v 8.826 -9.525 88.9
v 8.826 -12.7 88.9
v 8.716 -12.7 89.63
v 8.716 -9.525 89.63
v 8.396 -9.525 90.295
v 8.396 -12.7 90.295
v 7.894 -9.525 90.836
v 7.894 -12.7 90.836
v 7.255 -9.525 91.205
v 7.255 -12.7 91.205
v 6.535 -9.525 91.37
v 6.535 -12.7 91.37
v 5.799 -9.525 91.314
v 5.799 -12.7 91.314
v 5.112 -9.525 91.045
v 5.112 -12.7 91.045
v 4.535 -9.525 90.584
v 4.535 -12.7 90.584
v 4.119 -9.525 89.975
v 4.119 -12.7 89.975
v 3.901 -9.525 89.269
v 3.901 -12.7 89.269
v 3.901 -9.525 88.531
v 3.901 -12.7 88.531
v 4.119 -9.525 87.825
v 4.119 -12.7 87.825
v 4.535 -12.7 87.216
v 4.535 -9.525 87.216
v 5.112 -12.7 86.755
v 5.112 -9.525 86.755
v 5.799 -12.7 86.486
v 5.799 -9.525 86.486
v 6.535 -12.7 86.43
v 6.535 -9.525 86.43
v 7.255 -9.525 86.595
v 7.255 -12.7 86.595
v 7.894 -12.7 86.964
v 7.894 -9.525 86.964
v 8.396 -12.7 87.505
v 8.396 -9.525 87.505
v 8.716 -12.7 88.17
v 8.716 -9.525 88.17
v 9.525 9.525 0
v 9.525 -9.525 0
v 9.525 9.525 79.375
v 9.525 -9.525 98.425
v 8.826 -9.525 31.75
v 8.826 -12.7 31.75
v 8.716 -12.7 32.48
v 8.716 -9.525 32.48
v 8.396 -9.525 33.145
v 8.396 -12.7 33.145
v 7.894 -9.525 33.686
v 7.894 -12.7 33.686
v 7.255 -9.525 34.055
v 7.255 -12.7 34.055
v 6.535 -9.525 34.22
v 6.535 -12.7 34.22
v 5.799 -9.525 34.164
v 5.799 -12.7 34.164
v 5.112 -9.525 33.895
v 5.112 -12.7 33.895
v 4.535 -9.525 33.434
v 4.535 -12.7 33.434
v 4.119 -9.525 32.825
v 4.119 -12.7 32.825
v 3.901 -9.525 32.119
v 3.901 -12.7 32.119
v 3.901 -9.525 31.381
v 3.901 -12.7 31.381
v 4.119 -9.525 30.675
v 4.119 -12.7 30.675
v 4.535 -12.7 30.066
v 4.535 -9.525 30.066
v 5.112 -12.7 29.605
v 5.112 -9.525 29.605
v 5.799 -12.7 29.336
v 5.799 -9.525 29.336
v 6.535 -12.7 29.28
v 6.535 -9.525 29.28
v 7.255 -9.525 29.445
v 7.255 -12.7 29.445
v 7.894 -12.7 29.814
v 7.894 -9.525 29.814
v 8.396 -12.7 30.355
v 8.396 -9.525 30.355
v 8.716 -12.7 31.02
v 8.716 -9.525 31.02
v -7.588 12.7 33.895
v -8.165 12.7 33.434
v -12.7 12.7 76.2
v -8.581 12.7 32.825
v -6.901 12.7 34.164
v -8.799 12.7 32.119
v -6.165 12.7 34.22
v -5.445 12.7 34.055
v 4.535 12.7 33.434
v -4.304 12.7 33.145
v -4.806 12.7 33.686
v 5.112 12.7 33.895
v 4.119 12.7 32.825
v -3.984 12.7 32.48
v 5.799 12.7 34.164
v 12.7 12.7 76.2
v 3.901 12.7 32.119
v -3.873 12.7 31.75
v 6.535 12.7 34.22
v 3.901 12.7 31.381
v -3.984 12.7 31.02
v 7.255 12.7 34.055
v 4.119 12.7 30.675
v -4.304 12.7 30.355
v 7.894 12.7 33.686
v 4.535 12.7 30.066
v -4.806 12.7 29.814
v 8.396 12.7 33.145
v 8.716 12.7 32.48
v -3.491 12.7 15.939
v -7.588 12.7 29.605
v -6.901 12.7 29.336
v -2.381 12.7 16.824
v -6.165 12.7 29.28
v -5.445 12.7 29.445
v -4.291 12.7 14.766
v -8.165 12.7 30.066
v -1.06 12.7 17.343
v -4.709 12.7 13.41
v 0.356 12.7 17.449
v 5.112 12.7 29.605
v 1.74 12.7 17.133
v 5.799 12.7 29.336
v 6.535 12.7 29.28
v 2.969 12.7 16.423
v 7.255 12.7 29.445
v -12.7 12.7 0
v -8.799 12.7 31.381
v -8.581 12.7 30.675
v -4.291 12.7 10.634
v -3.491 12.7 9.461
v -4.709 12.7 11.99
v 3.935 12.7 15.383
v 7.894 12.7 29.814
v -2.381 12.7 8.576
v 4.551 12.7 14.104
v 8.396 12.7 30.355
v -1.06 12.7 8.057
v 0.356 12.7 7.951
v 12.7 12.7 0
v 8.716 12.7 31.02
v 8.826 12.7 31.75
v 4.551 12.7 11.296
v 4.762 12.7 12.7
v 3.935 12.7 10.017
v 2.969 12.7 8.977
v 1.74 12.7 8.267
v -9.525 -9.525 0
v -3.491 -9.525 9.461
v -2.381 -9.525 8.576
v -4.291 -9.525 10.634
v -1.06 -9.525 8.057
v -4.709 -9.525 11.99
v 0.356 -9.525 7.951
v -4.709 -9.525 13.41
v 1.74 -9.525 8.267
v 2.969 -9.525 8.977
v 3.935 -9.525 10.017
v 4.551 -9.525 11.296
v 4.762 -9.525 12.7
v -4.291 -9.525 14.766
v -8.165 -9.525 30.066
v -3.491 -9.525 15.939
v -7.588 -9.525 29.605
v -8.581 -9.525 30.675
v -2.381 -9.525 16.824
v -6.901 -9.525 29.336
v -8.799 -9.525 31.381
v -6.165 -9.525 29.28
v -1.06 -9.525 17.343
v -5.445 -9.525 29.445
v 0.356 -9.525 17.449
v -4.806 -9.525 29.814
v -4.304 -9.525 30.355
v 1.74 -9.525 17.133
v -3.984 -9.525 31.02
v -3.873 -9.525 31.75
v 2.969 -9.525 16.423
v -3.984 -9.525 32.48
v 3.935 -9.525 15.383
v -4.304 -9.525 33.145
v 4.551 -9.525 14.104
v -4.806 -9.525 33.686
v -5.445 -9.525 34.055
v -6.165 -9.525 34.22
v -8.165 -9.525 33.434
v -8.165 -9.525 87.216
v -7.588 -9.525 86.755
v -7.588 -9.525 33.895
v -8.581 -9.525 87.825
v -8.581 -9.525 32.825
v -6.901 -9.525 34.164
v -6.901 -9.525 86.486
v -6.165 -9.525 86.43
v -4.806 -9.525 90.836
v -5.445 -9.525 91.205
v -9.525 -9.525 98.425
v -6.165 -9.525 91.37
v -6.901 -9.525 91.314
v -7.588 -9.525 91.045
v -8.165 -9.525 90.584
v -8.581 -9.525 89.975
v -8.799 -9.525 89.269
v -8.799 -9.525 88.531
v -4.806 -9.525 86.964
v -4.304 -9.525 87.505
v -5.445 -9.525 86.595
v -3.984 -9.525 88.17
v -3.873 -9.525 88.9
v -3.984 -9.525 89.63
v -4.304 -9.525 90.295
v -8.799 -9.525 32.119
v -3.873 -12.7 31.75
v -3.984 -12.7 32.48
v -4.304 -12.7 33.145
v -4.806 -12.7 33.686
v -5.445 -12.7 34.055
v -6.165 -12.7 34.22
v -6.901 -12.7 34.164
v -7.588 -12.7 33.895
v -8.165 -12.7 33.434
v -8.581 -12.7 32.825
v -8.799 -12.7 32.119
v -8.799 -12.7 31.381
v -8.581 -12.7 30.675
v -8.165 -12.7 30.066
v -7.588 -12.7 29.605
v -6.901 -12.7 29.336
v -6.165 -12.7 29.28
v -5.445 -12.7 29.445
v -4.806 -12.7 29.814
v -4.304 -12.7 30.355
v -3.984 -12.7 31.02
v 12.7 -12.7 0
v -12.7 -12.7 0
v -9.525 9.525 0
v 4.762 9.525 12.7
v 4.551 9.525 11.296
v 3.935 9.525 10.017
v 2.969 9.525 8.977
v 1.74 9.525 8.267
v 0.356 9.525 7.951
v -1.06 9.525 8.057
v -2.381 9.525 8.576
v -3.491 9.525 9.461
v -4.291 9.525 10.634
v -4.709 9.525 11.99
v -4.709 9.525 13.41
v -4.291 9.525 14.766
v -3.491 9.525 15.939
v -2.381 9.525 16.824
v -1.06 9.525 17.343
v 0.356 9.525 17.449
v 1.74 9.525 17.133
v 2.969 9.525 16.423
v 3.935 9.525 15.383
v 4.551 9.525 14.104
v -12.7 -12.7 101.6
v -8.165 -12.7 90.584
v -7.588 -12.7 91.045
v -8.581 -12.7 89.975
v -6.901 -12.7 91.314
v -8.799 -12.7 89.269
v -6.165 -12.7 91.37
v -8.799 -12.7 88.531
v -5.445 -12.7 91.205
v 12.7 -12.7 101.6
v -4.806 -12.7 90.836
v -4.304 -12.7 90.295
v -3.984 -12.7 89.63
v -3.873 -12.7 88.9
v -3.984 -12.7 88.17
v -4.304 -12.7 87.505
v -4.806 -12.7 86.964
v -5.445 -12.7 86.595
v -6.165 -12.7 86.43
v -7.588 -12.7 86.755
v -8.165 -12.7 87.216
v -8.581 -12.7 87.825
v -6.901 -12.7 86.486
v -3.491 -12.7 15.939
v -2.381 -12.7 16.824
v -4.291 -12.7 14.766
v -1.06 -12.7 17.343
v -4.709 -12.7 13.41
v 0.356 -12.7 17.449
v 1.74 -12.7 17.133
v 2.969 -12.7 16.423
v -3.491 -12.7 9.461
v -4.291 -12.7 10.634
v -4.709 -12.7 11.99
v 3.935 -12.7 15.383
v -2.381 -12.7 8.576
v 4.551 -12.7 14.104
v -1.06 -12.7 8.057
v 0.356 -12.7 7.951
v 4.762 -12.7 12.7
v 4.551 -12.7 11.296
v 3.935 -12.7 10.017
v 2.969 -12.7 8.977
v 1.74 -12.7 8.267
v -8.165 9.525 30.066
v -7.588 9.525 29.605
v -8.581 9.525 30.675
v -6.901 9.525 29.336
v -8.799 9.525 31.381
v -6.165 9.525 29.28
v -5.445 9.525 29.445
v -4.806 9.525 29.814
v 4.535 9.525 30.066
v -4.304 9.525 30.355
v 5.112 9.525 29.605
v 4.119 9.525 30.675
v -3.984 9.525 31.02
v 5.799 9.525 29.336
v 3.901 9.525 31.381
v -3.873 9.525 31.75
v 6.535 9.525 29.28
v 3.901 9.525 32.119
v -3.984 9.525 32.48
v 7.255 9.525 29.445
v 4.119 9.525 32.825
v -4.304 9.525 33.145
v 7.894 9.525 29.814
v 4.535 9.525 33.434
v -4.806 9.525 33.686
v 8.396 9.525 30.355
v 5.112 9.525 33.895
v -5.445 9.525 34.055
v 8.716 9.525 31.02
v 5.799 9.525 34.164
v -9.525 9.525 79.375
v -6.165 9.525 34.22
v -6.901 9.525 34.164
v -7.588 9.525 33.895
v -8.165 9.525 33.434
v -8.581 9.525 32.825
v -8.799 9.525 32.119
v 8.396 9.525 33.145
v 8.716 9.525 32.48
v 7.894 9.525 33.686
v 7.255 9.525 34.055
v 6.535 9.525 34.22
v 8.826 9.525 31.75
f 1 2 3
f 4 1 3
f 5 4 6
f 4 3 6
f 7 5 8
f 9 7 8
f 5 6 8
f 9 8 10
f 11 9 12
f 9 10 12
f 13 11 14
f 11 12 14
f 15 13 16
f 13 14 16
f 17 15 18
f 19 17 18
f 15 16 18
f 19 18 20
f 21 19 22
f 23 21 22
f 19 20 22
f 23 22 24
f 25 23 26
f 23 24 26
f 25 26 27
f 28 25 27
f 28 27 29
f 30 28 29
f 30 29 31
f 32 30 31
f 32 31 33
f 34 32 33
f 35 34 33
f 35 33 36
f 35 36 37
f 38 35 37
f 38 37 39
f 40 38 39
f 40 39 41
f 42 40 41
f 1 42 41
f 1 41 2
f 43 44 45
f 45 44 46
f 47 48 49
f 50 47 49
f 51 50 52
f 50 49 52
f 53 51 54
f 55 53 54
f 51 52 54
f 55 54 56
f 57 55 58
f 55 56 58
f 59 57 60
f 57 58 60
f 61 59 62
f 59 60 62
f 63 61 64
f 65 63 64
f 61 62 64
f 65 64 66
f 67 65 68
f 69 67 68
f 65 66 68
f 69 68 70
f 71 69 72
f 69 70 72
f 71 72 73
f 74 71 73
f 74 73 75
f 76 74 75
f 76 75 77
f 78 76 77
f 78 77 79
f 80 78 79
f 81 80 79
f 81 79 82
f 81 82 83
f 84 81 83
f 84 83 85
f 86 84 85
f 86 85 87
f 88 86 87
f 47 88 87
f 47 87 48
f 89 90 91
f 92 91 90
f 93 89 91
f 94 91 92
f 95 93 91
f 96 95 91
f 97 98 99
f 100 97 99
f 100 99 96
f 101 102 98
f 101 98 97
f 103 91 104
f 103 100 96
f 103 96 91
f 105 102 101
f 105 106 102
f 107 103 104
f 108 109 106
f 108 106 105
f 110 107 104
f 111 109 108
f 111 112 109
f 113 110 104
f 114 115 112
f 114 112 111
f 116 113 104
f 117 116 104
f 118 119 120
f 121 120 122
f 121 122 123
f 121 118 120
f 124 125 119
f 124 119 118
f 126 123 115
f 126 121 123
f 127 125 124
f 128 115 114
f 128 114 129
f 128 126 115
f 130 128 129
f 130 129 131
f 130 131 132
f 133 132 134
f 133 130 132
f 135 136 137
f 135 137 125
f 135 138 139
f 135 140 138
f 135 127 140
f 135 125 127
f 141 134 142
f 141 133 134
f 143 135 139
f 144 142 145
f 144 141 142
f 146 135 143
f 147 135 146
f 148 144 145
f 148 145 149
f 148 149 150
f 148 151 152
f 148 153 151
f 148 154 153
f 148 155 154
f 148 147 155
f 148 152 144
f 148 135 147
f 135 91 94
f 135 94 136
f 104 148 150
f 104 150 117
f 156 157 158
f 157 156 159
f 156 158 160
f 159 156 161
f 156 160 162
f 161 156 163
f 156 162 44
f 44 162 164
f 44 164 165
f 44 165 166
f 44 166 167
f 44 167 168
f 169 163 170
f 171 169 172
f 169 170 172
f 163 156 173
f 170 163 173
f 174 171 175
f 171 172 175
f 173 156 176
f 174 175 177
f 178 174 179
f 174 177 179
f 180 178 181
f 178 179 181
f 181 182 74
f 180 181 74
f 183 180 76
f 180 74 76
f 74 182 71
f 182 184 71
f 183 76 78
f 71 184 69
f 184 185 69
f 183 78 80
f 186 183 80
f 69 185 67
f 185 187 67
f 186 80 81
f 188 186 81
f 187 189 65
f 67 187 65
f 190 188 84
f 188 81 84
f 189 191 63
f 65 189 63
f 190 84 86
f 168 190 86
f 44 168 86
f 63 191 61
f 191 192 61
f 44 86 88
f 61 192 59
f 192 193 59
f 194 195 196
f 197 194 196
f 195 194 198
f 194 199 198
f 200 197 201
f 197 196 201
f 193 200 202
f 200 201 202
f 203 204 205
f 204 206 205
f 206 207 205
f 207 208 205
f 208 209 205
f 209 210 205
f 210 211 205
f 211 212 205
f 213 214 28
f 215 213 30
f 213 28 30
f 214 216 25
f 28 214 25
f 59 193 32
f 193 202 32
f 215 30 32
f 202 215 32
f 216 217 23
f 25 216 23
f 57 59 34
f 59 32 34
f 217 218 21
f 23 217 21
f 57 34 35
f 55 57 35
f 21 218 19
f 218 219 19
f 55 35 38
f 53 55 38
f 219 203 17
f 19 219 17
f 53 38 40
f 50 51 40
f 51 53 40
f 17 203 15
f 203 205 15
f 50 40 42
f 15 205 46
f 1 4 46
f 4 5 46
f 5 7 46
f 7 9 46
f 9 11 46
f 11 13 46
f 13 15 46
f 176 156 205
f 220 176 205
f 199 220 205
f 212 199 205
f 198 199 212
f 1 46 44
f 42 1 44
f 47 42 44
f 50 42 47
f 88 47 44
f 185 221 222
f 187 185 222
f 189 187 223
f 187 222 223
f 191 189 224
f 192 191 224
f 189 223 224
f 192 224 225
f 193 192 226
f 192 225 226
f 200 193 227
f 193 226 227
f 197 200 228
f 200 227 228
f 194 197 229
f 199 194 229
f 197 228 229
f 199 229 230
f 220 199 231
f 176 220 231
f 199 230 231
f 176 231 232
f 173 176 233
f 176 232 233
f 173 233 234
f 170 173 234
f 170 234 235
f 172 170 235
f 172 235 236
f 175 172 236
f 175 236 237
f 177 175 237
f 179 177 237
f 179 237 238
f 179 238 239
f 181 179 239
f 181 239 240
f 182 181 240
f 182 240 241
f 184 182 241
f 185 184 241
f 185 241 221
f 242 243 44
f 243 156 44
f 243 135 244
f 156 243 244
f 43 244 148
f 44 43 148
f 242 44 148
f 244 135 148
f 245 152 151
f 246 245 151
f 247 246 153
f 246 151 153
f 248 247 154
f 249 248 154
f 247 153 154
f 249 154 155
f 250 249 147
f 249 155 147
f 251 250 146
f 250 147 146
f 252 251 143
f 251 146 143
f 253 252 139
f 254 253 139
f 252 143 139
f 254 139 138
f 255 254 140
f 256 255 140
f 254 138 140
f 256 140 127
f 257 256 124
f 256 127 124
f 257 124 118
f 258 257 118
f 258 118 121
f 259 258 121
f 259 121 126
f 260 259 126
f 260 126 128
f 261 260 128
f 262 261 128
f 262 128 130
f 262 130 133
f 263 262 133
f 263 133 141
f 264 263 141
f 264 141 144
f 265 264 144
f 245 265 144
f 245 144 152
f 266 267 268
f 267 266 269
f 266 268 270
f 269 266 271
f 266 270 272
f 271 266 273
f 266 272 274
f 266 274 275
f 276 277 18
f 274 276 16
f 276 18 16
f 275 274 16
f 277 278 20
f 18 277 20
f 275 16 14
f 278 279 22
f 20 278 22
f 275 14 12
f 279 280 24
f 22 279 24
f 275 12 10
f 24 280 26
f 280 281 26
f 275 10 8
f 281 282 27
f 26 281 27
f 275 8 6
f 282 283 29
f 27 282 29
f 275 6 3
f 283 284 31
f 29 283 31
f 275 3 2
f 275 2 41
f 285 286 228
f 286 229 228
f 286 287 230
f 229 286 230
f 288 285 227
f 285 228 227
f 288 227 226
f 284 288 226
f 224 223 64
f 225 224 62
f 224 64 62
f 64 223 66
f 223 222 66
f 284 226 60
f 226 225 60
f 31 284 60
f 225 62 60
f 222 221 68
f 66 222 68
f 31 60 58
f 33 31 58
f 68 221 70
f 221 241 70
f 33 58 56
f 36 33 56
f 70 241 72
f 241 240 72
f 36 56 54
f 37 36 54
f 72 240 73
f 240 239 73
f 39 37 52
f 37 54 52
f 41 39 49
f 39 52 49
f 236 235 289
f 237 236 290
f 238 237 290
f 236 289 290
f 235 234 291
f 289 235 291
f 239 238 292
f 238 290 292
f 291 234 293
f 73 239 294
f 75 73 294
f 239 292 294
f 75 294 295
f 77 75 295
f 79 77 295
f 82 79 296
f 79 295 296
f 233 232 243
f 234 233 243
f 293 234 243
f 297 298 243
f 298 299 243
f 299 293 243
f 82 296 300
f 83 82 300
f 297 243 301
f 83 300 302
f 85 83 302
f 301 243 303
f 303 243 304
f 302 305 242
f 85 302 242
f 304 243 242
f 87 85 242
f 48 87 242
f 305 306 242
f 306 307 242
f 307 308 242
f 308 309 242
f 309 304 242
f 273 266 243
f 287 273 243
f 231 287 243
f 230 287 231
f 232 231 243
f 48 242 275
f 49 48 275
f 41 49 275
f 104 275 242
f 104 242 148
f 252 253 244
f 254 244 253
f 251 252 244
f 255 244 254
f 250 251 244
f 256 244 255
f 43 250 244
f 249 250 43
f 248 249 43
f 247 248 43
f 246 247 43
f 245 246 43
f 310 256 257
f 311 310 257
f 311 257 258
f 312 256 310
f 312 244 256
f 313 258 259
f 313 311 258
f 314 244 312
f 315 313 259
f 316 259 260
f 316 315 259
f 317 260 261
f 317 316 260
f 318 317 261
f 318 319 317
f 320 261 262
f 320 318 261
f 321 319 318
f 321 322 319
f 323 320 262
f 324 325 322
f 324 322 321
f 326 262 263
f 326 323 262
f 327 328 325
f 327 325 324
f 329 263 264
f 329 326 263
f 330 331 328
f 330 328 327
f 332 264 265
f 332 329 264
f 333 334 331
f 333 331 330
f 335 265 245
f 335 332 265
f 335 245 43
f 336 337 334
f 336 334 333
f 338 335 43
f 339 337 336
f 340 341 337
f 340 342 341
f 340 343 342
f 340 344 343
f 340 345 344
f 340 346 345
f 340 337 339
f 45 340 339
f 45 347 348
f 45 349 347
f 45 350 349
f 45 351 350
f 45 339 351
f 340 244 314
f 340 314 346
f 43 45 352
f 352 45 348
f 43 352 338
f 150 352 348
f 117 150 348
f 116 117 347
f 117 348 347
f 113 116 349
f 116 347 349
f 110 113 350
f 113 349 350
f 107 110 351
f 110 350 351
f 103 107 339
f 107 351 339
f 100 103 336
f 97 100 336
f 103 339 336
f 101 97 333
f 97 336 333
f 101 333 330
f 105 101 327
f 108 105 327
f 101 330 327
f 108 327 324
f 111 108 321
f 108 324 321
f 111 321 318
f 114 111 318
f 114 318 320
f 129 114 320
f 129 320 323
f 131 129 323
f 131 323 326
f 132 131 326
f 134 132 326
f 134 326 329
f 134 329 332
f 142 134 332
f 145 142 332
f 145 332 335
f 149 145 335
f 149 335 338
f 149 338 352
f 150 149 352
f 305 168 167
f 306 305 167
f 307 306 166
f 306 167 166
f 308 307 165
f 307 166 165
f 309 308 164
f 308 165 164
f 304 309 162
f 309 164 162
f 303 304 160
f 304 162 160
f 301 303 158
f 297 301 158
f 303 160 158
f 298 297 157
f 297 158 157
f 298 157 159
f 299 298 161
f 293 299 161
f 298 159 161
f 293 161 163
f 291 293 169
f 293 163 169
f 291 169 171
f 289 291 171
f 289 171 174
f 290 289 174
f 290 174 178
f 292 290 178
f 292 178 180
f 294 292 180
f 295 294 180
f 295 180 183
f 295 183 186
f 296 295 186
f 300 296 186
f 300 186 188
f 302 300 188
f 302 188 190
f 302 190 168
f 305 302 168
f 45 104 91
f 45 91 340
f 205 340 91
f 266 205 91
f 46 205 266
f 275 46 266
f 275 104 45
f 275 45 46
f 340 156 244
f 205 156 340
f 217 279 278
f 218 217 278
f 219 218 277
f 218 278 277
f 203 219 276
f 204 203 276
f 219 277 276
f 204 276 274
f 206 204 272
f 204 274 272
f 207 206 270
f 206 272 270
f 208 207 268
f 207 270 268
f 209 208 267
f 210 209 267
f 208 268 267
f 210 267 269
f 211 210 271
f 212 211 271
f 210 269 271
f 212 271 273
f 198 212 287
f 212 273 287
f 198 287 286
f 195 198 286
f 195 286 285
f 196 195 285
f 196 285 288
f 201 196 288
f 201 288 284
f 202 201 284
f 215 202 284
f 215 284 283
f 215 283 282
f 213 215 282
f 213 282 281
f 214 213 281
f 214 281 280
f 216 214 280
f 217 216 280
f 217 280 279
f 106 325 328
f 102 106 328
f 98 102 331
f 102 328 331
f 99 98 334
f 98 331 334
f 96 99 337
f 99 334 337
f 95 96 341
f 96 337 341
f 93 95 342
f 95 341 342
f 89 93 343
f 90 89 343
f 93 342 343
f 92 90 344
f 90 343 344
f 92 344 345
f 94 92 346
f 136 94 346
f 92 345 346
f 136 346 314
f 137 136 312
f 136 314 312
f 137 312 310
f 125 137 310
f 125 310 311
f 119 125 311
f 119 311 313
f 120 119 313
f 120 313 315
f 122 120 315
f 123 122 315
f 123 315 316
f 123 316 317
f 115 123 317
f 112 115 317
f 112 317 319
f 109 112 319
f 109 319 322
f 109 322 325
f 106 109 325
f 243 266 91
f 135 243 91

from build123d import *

# Parameters (mm, degrees)
SKETCH1_W           = 25.4
SKETCH1_H           = 25.4
BOSS_EXTRUDE1_DEPTH = 101.6
SKETCH2_W           = 19.05
SKETCH2_H           = 19.05
CUT_EXTRUDE1_DEPTH  = 102.6
CUT_EXTRUDE2_DEPTH  = 26.4
SKETCH5_R           = 2.4765
CUT_EXTRUDE3_DEPTH  = 26.4
SKETCH7_R           = 4.7625
CUT_EXTRUDE5_DEPTH  = 26.4
SKETCH8_R           = 2.4765
CUT_EXTRUDE6_DEPTH  = 26.4


with BuildPart() as part:
    # Sketch1 → Boss-Extrude1 (new body)
    with BuildSketch(Plane.XY):
        Rectangle(SKETCH1_W, SKETCH1_H)
    extrude(amount=BOSS_EXTRUDE1_DEPTH)

    # Sketch2 → Cut-Extrude1 (cut, through all)
    with BuildSketch(Plane.XY.offset(101.6)):
        Rectangle(SKETCH2_W, SKETCH2_H)
    extrude(amount=-CUT_EXTRUDE1_DEPTH, mode=Mode.SUBTRACT)

    # Sketch4 → Cut-Extrude2 (cut, through all)
    with BuildSketch(Plane(origin=(12.7, 0, 0), x_dir=(0, 0, -1), z_dir=(1, 0, 0))):
        Polygon((-101.6, 12.7), (-76.2, 12.7), (-101.6, -12.7), align=None)
    extrude(amount=-CUT_EXTRUDE2_DEPTH, mode=Mode.SUBTRACT)

    # Sketch5 → Cut-Extrude3 (cut, through all)
    with BuildSketch(Plane.XZ.offset(12.7)):
        with Locations((-6.35, 88.9)):
            Circle(SKETCH5_R)
        with Locations((6.35, 88.9)):
            Circle(SKETCH5_R)
    extrude(amount=-CUT_EXTRUDE3_DEPTH, mode=Mode.SUBTRACT)

    # Sketch7 → Cut-Extrude5 (cut, through all)
    with BuildSketch(Plane(origin=(0, 12.7, 0), x_dir=(1, 0, 0), z_dir=(0, 1, 0))):
        with Locations((0, -12.7)):
            Circle(SKETCH7_R)
    extrude(amount=-CUT_EXTRUDE5_DEPTH, mode=Mode.SUBTRACT)

    # Sketch8 → Cut-Extrude6 (cut, through all)
    with BuildSketch(Plane.XZ.offset(12.7)):
        with Locations((6.35, 31.75)):
            Circle(SKETCH8_R)
        with Locations((-6.35, 31.75)):
            Circle(SKETCH8_R)
    extrude(amount=-CUT_EXTRUDE6_DEPTH, mode=Mode.SUBTRACT)


solid = part.part
